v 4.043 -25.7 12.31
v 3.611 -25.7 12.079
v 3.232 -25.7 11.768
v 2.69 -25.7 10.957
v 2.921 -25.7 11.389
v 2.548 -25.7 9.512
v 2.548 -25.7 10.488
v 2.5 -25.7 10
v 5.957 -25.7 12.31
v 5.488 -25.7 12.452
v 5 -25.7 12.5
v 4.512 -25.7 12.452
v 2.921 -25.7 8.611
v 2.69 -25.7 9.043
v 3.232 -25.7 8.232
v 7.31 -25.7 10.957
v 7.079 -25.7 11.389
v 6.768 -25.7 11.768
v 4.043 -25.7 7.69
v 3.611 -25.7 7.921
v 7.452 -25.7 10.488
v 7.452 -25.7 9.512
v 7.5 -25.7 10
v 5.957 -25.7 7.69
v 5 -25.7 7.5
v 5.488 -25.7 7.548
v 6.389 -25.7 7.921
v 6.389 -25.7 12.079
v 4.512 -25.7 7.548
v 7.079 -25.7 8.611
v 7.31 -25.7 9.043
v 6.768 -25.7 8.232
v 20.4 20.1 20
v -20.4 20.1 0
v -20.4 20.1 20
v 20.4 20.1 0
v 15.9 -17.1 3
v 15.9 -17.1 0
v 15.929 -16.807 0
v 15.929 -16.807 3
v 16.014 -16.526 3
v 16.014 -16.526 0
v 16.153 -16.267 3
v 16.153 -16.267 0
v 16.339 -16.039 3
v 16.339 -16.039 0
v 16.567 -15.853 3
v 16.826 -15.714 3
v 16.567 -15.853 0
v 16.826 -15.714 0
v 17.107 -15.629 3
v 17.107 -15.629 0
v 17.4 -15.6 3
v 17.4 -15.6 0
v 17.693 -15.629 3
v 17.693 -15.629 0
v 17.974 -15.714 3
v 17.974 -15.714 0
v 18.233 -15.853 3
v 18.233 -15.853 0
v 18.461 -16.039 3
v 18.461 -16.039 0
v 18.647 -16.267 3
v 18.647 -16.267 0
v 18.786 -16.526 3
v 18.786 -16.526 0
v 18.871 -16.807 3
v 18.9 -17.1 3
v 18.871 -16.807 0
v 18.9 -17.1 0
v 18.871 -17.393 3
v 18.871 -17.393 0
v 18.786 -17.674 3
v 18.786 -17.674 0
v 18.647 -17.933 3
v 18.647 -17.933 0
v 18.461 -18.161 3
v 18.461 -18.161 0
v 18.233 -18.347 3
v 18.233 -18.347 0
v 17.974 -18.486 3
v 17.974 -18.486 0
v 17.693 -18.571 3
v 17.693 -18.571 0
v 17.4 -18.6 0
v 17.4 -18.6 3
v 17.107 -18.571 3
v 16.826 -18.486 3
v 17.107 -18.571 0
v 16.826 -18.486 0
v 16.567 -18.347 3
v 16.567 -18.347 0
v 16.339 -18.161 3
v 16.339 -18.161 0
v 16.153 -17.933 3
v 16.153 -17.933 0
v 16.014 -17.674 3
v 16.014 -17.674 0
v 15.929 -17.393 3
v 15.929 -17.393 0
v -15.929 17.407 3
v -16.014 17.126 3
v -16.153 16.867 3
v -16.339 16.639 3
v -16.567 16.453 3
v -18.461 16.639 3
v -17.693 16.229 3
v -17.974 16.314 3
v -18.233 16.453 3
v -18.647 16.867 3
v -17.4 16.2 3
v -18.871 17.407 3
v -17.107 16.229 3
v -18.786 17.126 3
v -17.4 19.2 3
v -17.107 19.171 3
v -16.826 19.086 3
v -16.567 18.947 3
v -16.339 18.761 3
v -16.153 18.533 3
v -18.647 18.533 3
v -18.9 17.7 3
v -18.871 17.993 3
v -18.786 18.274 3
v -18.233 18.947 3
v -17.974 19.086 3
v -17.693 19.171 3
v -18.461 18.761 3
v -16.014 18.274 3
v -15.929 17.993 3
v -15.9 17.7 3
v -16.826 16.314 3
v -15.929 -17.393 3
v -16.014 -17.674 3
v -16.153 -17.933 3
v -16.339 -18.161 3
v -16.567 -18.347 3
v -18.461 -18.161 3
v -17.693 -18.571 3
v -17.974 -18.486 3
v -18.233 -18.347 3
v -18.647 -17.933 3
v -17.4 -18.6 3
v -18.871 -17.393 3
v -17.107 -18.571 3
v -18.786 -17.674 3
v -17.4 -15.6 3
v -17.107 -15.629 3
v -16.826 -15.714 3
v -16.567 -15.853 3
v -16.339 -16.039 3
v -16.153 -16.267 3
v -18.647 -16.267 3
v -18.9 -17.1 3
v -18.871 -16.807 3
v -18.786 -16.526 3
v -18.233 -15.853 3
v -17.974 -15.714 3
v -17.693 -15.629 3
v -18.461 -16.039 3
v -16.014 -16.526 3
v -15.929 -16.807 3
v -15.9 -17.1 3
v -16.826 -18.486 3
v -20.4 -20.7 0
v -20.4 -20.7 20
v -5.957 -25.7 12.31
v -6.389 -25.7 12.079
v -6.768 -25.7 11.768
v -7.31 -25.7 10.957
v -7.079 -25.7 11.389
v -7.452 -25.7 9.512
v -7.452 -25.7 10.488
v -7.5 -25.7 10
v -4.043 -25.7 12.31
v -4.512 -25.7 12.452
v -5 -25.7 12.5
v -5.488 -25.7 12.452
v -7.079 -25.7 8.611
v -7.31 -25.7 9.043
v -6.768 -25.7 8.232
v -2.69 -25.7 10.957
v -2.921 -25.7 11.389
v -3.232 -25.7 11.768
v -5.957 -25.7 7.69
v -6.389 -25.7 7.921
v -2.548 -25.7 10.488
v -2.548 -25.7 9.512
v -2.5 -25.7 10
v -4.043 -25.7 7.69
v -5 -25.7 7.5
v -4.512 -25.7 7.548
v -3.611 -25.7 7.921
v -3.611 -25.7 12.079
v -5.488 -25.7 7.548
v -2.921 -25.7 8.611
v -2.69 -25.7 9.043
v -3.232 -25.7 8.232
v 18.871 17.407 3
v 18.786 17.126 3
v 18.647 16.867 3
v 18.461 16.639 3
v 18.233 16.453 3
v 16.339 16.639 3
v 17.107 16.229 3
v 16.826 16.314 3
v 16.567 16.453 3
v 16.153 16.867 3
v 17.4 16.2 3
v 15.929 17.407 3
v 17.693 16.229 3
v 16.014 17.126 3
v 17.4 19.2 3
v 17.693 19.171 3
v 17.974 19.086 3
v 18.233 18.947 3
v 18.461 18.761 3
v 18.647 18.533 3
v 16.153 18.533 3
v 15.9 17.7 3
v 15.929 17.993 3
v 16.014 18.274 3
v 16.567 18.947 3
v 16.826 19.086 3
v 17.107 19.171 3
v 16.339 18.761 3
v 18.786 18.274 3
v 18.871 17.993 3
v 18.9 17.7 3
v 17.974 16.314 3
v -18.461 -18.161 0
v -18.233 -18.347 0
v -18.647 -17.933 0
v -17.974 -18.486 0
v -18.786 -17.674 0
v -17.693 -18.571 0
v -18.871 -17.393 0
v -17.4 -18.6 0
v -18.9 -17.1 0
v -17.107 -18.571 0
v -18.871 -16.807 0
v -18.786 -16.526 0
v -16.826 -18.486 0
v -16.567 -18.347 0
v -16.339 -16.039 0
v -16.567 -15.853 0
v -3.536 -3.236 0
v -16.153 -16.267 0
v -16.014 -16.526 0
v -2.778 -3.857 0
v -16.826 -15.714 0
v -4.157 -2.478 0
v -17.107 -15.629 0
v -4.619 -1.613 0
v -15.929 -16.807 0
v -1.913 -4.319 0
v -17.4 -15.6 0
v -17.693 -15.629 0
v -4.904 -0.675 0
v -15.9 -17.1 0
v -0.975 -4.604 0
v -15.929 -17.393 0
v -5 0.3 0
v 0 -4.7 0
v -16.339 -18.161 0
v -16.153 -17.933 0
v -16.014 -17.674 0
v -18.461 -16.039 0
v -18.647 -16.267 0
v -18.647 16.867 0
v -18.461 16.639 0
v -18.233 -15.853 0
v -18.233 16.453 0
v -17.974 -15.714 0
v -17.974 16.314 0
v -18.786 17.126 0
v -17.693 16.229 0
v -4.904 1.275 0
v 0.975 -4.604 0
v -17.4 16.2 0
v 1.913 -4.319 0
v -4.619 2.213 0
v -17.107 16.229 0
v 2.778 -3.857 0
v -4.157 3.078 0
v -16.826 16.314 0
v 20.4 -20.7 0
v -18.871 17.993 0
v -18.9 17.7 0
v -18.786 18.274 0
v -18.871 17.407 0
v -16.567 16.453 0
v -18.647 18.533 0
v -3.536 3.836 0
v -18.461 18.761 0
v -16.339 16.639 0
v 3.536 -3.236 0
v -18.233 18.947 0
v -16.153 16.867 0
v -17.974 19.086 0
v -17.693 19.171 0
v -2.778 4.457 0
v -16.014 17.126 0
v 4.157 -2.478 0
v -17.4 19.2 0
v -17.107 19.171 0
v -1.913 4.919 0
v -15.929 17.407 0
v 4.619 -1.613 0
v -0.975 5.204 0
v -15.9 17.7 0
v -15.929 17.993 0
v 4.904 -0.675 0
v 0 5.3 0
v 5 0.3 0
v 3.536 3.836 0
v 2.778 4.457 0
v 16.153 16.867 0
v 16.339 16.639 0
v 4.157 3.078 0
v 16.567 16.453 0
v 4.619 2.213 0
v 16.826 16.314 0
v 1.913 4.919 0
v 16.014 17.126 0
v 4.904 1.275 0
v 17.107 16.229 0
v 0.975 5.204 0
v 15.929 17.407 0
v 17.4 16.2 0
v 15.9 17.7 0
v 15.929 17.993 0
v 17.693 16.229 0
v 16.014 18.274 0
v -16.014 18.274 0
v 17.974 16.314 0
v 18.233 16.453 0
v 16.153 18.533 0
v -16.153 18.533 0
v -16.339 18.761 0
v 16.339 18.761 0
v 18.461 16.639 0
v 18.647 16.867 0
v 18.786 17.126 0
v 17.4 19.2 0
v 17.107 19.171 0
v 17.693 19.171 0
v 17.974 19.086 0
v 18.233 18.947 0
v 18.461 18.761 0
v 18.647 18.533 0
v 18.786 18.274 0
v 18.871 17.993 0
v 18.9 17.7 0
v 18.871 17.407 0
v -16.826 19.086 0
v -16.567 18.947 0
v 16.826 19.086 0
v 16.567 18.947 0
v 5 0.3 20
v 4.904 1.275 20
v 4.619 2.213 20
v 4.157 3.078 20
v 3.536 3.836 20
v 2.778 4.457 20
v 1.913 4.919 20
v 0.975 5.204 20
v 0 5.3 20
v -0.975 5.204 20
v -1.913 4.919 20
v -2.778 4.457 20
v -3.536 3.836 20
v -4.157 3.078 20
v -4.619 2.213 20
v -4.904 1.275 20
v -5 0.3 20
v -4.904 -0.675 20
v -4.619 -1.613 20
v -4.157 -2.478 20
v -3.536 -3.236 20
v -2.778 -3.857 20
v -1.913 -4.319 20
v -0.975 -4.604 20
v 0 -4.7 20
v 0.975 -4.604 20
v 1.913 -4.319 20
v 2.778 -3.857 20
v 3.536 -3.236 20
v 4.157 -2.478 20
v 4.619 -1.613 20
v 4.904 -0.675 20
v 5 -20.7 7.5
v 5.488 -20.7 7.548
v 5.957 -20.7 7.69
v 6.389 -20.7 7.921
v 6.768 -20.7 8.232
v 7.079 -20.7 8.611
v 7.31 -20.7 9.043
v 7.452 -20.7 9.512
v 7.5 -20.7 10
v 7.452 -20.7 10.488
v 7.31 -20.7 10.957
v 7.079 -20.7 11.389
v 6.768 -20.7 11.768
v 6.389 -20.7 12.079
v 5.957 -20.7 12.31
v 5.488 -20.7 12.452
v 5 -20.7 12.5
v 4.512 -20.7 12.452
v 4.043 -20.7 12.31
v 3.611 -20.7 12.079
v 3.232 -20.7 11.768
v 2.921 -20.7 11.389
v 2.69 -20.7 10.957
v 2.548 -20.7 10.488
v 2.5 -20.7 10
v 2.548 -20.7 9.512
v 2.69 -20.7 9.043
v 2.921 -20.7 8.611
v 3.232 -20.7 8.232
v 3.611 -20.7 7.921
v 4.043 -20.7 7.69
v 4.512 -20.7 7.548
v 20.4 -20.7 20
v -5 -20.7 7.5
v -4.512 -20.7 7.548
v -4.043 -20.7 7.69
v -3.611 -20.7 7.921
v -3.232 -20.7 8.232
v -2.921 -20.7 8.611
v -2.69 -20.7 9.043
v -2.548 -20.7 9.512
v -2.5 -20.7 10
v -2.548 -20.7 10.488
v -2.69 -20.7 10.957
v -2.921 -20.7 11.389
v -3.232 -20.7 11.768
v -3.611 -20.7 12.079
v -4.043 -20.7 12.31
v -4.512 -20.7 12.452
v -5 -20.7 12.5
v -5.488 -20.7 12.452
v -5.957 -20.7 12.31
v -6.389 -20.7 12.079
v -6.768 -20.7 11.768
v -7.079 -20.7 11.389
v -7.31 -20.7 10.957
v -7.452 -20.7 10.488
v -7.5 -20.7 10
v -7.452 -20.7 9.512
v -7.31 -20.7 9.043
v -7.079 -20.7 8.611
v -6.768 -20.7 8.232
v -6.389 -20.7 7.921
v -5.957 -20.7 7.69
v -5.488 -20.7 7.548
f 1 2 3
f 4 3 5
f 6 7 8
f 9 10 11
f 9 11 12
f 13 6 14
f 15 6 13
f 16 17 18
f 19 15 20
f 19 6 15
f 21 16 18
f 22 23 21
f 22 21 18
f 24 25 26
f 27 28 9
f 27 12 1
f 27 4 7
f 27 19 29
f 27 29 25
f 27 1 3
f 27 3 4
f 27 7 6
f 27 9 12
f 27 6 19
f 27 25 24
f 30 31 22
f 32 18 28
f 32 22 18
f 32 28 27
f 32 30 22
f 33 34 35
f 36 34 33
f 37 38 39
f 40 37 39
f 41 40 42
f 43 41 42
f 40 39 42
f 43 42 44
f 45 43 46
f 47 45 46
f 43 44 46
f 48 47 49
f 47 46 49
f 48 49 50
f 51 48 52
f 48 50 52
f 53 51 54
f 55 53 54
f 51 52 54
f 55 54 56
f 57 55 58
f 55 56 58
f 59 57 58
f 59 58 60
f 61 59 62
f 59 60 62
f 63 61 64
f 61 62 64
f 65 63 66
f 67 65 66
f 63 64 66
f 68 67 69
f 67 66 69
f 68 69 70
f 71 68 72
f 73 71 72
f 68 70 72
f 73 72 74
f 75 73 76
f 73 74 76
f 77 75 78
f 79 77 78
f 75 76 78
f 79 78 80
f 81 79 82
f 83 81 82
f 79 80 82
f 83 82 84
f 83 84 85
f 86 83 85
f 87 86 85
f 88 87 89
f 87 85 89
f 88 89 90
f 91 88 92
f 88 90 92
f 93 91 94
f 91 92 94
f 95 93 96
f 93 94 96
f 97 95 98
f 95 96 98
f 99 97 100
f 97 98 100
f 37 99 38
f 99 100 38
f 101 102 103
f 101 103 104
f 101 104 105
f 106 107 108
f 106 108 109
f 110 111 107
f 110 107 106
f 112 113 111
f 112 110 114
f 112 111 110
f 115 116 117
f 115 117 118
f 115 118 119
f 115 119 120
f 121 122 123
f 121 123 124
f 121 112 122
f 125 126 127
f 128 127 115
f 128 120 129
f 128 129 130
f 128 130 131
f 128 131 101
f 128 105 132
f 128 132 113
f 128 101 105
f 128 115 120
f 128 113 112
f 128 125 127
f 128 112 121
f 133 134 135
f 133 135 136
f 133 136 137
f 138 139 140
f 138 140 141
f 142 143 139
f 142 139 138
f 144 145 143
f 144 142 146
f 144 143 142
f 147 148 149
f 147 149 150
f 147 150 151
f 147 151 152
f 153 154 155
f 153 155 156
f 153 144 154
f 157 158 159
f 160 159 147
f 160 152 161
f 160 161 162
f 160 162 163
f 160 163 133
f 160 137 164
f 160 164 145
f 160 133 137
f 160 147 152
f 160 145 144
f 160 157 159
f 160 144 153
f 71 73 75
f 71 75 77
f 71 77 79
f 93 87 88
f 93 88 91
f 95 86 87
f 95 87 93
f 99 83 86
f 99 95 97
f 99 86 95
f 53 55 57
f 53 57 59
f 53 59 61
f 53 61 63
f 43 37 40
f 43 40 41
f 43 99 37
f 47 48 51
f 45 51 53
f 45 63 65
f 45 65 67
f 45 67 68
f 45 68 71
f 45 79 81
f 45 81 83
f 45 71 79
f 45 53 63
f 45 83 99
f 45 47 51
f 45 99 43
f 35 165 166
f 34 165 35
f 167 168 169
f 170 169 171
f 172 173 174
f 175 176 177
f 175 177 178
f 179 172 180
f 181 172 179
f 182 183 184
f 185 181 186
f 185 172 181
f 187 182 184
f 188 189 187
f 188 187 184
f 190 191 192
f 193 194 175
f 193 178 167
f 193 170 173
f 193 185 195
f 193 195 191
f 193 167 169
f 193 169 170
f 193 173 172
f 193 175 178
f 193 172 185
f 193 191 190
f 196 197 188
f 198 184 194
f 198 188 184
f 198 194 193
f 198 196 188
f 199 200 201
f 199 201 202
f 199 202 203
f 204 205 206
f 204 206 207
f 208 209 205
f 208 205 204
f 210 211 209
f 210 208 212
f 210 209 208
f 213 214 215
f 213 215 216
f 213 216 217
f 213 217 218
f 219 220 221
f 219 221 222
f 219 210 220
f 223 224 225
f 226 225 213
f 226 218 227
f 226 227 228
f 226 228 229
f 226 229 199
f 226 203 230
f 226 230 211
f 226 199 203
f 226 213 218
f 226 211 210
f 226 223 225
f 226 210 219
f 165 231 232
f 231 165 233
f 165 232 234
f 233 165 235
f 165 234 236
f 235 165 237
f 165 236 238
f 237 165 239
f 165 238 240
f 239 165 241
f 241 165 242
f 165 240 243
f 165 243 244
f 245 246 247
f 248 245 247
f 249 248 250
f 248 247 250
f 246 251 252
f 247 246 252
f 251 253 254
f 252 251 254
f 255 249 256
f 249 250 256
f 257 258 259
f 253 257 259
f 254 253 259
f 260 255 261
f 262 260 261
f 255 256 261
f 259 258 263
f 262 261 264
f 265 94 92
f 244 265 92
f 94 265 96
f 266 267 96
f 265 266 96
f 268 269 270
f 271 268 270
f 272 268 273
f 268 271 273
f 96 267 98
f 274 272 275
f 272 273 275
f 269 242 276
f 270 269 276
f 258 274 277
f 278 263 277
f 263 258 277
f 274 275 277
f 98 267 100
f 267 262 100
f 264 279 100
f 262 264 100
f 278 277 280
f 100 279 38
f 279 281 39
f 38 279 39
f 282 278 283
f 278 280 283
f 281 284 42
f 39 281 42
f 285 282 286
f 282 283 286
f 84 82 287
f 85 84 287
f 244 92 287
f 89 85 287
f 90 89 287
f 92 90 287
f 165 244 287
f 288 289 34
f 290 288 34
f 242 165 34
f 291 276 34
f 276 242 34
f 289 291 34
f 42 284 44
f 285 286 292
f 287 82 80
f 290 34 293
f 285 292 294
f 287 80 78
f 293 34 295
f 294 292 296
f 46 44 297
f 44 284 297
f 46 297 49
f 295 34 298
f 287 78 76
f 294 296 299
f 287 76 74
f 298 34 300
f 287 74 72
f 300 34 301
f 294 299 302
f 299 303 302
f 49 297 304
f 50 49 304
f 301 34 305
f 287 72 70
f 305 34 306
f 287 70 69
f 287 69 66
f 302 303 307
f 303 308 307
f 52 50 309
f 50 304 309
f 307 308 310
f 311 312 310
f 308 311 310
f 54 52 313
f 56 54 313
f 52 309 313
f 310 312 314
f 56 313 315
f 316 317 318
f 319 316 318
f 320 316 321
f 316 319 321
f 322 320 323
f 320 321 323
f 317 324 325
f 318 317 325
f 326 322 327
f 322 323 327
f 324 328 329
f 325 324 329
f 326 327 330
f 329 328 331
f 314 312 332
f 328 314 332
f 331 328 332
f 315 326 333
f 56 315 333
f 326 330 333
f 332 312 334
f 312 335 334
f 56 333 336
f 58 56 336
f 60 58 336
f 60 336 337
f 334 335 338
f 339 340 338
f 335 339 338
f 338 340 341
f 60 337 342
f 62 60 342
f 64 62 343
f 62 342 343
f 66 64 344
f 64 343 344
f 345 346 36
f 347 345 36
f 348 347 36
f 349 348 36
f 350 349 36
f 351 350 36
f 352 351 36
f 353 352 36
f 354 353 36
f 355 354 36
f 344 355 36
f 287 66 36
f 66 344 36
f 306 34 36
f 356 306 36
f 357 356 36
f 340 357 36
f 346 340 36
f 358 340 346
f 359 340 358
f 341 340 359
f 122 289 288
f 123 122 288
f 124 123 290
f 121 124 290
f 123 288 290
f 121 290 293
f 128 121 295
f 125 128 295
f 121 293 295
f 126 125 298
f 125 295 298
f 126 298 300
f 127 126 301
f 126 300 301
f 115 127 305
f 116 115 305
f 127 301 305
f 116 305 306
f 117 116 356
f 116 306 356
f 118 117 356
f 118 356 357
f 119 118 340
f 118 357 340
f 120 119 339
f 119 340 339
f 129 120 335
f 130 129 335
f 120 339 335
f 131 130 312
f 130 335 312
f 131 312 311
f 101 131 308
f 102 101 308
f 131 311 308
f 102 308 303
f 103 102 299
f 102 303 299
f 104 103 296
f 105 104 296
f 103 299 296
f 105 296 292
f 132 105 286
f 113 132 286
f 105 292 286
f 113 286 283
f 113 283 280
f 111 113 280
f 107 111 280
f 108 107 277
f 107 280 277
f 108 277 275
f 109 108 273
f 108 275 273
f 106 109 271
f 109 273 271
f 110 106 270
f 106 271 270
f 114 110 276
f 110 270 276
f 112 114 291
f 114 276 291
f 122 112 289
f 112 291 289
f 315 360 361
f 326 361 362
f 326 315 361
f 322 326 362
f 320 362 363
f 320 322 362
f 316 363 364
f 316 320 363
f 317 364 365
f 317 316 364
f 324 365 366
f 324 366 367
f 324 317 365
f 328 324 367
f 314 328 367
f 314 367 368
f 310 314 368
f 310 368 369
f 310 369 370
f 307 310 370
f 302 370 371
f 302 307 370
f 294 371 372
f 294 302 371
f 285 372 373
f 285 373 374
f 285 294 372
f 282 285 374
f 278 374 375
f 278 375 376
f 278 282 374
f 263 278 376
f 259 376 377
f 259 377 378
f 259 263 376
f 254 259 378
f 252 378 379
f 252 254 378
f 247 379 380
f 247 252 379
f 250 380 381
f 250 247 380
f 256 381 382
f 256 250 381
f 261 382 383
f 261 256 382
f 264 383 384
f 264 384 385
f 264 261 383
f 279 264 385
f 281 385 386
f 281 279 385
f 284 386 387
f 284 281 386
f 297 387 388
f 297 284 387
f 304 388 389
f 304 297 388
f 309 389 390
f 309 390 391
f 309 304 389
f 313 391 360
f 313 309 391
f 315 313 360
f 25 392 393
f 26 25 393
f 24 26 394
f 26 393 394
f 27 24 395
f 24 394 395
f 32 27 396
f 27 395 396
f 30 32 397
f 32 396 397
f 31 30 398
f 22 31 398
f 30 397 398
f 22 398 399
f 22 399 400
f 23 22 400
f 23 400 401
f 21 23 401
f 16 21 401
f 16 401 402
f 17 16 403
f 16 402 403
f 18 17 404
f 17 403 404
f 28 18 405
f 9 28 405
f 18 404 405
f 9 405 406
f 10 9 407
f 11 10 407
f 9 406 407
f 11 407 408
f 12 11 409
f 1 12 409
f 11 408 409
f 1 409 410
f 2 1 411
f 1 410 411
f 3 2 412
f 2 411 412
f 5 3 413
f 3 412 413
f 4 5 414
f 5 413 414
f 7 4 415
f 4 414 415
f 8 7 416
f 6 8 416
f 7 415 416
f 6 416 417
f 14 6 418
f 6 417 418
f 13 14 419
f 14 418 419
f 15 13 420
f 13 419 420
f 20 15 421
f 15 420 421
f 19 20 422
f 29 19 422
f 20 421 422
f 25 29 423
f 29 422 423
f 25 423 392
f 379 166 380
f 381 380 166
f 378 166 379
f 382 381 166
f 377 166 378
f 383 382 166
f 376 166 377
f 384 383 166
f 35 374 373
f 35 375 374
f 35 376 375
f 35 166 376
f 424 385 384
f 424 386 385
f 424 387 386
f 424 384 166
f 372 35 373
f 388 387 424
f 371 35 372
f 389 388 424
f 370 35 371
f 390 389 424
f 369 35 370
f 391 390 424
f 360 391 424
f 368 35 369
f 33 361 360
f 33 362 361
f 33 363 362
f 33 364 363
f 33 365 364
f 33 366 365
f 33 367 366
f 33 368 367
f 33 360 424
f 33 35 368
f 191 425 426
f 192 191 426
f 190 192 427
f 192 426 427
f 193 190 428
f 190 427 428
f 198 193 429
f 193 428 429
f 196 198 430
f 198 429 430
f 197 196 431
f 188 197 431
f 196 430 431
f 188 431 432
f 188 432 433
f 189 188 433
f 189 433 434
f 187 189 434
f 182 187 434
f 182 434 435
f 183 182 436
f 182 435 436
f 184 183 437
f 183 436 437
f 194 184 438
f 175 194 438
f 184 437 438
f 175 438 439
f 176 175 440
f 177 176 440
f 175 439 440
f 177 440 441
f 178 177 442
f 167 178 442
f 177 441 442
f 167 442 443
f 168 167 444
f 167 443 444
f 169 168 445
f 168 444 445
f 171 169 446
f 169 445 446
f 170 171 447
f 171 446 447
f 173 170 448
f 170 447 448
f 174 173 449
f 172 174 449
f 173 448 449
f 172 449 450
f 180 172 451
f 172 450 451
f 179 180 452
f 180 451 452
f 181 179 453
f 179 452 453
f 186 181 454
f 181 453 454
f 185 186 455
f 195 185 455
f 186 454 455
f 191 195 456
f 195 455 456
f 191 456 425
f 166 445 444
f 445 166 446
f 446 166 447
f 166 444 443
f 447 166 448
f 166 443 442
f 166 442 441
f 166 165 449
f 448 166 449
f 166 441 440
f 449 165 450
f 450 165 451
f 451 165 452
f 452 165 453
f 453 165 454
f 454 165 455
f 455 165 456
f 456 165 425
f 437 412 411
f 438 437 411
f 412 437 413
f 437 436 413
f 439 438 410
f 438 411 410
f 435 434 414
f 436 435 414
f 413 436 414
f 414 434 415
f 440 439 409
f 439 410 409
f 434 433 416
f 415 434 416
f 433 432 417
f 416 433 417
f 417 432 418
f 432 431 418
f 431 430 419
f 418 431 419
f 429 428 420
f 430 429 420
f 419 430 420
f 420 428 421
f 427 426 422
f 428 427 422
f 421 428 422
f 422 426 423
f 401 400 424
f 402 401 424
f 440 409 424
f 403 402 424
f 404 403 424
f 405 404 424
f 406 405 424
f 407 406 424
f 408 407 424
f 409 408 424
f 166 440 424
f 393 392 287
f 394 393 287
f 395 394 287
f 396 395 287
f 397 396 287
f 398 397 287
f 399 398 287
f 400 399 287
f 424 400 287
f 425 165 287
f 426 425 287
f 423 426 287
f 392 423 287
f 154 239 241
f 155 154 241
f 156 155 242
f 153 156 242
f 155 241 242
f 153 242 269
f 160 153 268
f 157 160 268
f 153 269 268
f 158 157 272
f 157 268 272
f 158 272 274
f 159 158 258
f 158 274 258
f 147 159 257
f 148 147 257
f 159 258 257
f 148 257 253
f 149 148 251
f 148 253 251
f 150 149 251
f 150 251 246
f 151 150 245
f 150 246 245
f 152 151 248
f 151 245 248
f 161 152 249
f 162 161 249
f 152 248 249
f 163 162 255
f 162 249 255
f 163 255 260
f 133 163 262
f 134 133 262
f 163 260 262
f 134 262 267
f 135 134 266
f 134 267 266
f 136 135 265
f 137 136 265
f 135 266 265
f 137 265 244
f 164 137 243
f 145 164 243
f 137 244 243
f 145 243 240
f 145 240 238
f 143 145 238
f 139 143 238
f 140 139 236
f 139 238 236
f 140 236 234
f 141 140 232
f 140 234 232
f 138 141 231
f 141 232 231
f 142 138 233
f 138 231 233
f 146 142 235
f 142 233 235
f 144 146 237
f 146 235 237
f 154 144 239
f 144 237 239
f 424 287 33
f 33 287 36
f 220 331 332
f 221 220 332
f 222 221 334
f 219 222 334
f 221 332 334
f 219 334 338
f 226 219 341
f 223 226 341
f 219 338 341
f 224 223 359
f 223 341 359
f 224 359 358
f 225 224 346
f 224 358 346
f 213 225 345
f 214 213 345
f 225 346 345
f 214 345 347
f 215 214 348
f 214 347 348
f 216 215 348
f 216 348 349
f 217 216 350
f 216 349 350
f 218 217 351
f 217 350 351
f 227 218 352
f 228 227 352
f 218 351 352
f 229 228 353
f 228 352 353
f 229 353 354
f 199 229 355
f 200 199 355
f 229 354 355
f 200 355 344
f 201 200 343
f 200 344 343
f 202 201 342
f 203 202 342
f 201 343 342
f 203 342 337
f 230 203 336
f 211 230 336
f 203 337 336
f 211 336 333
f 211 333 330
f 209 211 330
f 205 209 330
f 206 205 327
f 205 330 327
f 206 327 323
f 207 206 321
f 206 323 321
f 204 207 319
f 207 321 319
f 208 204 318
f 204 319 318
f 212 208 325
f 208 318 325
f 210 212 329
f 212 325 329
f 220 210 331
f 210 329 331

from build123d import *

# Parameters (mm, degrees)
SKETCH2_W           = 40.8
SKETCH2_H           = 40.8
SKETCH2_R           = 1.3
SKETCH2_R_2         = 5
BOSS_EXTRUDE1_DEPTH = 20
SKETCH3_R           = 2.5
BOSS_EXTRUDE2_DEPTH = 5
SKETCH9_R           = 1.5
CUT_EXTRUDE6_DEPTH  = 3


with BuildPart() as part:
    # Sketch2 → Boss-Extrude1 (new body)
    # profile 1 of 5: a face of its own
    with BuildSketch(Plane.XY):
        with Locations((0, -0.3)):
            Rectangle(SKETCH2_W, SKETCH2_H)
        with Locations((-17.4, 17.7)):
            Circle(SKETCH2_R, mode=Mode.SUBTRACT)
        with Locations((0, 0.3)):
            Circle(SKETCH2_R_2, mode=Mode.SUBTRACT)
        with Locations((17.4, 17.7)):
            Circle(SKETCH2_R, mode=Mode.SUBTRACT)
        with Locations((17.4, -17.1)):
            Circle(SKETCH2_R, mode=Mode.SUBTRACT)
        with Locations((-17.4, -17.1)):
            Circle(SKETCH2_R, mode=Mode.SUBTRACT)
    # profile 2 of 5: a face of its own
    with BuildSketch(Plane.XY):
        with Locations((17.4, 17.7)):
            Circle(SKETCH2_R)
    # profile 3 of 5: a face of its own
    with BuildSketch(Plane.XY):
        with Locations((-17.4, -17.1)):
            Circle(SKETCH2_R)
    # profile 4 of 5: a face of its own
    with BuildSketch(Plane.XY):
        with Locations((-17.4, 17.7)):
            Circle(SKETCH2_R)
    # profile 5 of 5: a face of its own
    with BuildSketch(Plane.XY):
        with Locations((17.4, -17.1)):
            Circle(SKETCH2_R)
    extrude(amount=BOSS_EXTRUDE1_DEPTH)

    # Sketch3 → Boss-Extrude2 (add)
    with BuildSketch(Plane.XZ.offset(20.7)):
        with Locations(Location((5, 10, 0), (0, 0, 270))):
            Circle(SKETCH3_R)
        with Locations(Location((-5, 10, 0), (0, 0, 270))):
            Circle(SKETCH3_R)
    extrude(amount=BOSS_EXTRUDE2_DEPTH)

    # Sketch9 → Cut-Extrude6 (cut)
    with BuildSketch(Plane(origin=(0, 0, 0), x_dir=(-1, 0, 0), z_dir=(0, 0, -1))):
        with Locations((-17.4, 17.7)):
            Circle(SKETCH9_R)
        with Locations((17.4, 17.7)):
            Circle(SKETCH9_R)
        with Locations((17.4, -17.1)):
            Circle(SKETCH9_R)
        with Locations((-17.4, -17.1)):
            Circle(SKETCH9_R)
    extrude(amount=-CUT_EXTRUDE6_DEPTH, mode=Mode.SUBTRACT)


solid = part.part
